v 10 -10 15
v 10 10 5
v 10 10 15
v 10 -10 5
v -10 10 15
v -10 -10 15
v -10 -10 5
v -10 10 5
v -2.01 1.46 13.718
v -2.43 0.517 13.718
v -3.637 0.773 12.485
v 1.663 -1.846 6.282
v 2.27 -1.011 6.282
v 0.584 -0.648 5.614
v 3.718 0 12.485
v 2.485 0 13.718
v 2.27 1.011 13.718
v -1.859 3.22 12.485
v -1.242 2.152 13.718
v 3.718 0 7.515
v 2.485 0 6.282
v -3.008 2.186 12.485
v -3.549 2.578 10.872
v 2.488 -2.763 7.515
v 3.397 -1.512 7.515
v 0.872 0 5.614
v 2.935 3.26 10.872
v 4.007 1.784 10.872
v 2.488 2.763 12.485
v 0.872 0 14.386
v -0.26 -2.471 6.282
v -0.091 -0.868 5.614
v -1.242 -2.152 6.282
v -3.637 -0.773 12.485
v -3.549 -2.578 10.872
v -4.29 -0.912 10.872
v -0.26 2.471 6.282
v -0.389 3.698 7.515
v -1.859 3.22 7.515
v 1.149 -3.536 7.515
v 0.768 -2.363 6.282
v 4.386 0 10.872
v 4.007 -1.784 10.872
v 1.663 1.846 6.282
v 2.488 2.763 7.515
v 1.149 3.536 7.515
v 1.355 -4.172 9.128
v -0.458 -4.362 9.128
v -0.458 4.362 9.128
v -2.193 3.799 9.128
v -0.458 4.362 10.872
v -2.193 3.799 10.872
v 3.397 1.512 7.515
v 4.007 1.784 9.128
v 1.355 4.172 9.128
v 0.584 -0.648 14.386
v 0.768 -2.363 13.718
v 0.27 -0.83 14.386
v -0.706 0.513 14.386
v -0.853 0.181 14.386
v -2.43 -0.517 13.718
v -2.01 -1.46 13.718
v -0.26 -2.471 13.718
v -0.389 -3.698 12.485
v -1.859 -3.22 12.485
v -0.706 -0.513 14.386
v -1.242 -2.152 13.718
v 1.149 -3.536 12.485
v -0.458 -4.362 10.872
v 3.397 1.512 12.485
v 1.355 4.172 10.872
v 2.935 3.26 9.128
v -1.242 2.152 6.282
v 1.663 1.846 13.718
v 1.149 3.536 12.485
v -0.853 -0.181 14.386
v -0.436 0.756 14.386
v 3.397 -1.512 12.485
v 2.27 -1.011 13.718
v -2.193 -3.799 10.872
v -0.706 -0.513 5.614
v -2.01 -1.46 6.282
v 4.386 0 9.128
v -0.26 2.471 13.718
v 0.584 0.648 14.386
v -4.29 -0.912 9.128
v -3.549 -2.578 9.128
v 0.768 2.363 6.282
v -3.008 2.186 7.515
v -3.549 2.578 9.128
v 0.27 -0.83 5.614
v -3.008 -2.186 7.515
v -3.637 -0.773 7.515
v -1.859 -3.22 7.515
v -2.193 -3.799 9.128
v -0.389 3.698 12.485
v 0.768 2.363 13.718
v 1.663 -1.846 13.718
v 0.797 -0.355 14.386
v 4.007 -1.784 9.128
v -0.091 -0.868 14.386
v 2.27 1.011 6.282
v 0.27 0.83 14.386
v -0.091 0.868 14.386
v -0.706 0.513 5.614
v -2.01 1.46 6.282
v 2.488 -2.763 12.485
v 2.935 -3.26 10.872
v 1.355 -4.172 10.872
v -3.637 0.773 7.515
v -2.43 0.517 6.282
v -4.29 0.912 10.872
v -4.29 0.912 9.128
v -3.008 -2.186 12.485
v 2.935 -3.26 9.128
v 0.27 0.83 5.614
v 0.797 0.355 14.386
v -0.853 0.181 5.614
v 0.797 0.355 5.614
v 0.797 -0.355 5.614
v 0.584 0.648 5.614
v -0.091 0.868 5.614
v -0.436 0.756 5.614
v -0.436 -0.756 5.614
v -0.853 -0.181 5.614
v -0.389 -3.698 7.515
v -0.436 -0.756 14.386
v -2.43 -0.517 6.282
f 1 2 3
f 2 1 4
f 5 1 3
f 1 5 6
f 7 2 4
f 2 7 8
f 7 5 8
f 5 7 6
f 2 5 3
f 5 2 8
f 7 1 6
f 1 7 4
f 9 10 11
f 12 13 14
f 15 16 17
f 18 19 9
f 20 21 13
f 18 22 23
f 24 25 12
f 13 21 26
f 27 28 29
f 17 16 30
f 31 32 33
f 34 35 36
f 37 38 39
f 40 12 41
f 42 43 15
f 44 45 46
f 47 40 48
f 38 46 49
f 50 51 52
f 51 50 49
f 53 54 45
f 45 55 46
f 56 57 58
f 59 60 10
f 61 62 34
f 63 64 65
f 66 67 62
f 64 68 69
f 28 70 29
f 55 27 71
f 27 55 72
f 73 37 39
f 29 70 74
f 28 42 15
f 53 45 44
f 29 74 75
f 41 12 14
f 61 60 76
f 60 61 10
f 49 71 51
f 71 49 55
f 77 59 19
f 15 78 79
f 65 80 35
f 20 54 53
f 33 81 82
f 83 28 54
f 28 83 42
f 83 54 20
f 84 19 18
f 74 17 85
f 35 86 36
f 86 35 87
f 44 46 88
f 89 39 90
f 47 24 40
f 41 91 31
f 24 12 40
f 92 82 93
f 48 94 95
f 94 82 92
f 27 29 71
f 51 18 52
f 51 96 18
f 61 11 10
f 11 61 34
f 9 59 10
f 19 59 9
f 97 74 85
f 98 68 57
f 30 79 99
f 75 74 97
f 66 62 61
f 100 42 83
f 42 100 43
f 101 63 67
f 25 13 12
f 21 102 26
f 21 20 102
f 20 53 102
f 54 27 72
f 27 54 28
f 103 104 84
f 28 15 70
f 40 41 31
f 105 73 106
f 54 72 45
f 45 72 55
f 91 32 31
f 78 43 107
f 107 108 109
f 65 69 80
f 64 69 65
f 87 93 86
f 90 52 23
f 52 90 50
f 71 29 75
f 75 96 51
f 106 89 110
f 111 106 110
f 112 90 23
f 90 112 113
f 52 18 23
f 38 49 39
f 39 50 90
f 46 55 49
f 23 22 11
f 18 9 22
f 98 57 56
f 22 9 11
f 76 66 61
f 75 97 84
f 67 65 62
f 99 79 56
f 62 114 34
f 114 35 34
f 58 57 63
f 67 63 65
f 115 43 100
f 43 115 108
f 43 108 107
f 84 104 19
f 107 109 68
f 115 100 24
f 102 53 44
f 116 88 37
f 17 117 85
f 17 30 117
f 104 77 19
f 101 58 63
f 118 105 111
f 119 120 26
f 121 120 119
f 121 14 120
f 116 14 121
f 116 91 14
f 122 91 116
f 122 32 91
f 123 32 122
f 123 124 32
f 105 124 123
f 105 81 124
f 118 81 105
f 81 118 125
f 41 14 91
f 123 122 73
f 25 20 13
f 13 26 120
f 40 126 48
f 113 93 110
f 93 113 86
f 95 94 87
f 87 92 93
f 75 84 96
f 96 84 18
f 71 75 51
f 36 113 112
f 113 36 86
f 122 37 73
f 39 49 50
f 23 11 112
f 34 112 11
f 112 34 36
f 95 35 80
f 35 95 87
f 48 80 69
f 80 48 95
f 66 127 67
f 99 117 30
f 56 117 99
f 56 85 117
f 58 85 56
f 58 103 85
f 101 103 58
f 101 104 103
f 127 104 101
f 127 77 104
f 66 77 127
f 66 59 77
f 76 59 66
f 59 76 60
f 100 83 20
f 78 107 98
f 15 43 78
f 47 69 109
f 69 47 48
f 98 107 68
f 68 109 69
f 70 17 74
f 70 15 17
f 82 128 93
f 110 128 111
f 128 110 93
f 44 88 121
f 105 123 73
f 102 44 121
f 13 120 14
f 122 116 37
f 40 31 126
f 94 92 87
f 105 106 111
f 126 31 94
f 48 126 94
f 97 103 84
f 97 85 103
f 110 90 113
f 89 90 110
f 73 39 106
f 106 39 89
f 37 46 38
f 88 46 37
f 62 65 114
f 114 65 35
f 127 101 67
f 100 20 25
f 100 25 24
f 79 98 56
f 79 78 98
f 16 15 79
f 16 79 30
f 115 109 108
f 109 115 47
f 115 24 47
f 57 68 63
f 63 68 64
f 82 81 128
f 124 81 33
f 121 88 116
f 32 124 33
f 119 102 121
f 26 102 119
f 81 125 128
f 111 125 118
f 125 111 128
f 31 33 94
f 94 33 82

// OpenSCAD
base = 20;
h = base / 2;
r = sqrt(base);
translate([0, 0, h]) difference() {
    cube([base, base, h], center = true);
    sphere(r = r);
}
